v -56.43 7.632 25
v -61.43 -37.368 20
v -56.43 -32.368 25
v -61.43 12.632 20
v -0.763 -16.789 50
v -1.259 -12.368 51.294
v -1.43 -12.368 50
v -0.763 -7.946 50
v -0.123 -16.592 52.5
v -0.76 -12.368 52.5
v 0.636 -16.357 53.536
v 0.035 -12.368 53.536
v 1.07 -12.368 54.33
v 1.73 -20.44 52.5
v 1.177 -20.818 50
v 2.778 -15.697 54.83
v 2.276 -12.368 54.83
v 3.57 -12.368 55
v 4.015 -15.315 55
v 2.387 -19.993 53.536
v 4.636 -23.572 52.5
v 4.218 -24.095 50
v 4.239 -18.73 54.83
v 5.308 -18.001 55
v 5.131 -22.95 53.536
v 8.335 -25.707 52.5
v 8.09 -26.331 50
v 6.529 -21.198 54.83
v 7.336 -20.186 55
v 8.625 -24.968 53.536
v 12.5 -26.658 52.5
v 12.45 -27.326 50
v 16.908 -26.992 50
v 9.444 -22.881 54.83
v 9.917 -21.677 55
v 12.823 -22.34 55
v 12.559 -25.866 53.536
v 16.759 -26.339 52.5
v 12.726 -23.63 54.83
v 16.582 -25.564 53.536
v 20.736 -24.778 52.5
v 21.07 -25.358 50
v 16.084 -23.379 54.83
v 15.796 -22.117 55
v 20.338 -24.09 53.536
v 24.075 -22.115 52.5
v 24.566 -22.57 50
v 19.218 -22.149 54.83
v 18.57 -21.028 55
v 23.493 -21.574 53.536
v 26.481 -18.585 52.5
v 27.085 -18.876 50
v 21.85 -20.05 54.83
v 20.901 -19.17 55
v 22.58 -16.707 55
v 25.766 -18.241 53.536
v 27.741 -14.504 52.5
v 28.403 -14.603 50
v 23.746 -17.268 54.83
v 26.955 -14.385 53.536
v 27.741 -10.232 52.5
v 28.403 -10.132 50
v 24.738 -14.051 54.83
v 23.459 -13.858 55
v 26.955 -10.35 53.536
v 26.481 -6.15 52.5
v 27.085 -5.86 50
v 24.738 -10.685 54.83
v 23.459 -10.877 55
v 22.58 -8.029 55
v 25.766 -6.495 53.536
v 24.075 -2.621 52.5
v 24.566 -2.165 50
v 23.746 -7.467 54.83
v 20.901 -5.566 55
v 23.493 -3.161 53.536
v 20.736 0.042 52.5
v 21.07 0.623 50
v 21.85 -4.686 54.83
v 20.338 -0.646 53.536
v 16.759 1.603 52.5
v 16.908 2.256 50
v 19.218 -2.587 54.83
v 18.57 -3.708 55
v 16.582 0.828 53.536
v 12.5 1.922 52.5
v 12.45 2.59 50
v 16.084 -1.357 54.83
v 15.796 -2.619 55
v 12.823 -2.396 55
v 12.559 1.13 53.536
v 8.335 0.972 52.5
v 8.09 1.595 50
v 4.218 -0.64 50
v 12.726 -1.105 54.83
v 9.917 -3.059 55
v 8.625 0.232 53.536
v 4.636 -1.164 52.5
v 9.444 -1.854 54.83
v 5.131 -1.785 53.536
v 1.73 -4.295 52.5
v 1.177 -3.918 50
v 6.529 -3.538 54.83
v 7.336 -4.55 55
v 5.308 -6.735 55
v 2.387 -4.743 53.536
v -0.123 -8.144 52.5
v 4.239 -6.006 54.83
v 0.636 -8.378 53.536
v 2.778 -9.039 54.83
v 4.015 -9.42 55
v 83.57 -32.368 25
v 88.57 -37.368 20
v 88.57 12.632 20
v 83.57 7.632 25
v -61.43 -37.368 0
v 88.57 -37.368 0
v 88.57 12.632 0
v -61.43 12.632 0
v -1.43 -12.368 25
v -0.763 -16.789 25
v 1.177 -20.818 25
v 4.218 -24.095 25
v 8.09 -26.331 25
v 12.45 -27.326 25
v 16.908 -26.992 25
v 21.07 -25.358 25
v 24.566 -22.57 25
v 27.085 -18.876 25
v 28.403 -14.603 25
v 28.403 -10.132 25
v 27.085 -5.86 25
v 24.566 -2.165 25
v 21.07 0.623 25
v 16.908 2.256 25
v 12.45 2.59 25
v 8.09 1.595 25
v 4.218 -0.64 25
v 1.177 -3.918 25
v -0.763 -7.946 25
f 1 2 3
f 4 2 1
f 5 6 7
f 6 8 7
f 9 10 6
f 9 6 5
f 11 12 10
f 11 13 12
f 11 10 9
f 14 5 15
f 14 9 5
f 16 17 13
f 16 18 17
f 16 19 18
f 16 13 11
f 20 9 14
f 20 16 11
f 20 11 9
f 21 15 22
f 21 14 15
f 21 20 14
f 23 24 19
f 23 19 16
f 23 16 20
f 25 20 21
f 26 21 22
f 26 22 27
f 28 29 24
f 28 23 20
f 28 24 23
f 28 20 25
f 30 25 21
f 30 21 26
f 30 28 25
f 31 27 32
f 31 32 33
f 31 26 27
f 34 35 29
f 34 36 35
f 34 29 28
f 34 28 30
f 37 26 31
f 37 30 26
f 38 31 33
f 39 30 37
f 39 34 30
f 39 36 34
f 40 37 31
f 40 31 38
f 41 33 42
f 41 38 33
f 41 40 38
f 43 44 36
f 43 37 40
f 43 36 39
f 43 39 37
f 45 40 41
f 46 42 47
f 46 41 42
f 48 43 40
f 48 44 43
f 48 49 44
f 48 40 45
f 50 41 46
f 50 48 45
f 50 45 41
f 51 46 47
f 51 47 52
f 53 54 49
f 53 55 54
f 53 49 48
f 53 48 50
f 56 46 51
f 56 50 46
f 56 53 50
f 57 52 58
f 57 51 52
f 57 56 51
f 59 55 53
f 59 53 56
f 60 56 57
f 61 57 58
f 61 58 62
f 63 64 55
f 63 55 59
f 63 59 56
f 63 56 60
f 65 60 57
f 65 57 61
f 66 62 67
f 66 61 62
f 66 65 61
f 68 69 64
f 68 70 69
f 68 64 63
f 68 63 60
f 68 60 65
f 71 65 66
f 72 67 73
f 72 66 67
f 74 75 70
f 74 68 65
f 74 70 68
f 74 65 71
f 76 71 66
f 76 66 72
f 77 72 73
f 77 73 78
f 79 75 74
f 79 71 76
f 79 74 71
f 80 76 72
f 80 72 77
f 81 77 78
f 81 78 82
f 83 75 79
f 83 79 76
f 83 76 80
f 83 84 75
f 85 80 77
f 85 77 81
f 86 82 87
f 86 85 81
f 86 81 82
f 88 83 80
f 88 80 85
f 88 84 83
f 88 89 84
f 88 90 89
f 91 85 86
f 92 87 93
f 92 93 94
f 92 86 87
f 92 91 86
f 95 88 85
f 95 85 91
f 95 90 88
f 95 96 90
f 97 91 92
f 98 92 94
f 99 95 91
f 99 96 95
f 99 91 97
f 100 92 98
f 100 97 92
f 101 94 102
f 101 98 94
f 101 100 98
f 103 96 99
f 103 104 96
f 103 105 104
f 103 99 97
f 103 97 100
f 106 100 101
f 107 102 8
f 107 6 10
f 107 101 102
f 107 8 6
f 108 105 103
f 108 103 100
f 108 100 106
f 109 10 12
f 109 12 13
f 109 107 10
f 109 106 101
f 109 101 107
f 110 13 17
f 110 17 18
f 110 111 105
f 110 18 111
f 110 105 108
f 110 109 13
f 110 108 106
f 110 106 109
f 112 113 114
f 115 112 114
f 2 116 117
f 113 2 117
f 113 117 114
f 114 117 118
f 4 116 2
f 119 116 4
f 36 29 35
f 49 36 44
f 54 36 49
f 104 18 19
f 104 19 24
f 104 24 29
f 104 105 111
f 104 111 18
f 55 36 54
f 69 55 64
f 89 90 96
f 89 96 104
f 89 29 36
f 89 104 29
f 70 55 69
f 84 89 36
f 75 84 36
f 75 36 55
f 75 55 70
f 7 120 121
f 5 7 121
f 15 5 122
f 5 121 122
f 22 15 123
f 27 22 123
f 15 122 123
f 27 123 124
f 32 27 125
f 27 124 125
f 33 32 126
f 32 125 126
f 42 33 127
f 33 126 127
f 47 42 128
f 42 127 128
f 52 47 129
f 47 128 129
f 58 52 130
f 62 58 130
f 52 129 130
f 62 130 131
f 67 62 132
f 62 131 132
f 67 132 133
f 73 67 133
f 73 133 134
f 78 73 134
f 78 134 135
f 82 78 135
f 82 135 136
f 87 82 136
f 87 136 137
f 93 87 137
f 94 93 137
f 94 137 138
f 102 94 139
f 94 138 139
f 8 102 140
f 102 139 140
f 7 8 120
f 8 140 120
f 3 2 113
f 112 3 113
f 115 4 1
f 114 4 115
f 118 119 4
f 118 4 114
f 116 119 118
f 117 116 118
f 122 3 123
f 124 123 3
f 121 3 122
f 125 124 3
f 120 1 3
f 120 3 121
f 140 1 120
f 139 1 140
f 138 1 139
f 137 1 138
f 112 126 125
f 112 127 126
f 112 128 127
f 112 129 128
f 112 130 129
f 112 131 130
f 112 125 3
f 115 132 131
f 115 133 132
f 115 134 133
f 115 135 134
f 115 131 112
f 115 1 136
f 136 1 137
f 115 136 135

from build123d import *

# Parameters (mm, degrees)
F0_W     = 150
F0_H     = 50
F1_DEPTH = 25
F3_DEPTH = 30
F4_R     = 5
F5_SIZE  = 5


with BuildPart() as f1:
    # F0 (on Top) → F1 (new body)
    with BuildSketch(Plane.XY):
        with Locations((13.5704912245, -12.3678184533)):
            Rectangle(F0_W, F0_H)
    extrude(amount=F1_DEPTH)

    # F2 (on face) → F3 (join)
    with BuildSketch(Plane.XY.offset(25)):
        with BuildLine():
            Line((-1.4295087755, -12.3678184533), (28.5704912245, -12.3678184533))
            ThreePointArc((28.5704912245, -12.3678184533), (13.5704912245, 2.6321815467), (-1.4295087755, -12.3678184533))
        make_face()
        with BuildLine():
            ThreePointArc((-1.4295087755, -12.3678184533), (13.5704912245, -27.3678184533), (28.5704912245, -12.3678184533))
            Line((28.5704912245, -12.3678184533), (-1.4295087755, -12.3678184533))
        make_face()
    extrude(amount=F3_DEPTH)

    # F4
    f4_edges = [f1.edges().sort_by_distance(p)[0] for p in [
        (28.570491, -12.367818, 55),
    ]]
    fillet(f4_edges, radius=F4_R)

    # F5
    f5_edges = [f1.edges().sort_by_distance(p)[0] for p in [
        (-61.429509, -12.367818, 25),
        (13.570491, -37.367818, 25),
        (13.570491, 12.632182, 25),
        (88.570491, -12.367818, 25),
    ]]
    chamfer(f5_edges, length=F5_SIZE)


solid = f1.part
